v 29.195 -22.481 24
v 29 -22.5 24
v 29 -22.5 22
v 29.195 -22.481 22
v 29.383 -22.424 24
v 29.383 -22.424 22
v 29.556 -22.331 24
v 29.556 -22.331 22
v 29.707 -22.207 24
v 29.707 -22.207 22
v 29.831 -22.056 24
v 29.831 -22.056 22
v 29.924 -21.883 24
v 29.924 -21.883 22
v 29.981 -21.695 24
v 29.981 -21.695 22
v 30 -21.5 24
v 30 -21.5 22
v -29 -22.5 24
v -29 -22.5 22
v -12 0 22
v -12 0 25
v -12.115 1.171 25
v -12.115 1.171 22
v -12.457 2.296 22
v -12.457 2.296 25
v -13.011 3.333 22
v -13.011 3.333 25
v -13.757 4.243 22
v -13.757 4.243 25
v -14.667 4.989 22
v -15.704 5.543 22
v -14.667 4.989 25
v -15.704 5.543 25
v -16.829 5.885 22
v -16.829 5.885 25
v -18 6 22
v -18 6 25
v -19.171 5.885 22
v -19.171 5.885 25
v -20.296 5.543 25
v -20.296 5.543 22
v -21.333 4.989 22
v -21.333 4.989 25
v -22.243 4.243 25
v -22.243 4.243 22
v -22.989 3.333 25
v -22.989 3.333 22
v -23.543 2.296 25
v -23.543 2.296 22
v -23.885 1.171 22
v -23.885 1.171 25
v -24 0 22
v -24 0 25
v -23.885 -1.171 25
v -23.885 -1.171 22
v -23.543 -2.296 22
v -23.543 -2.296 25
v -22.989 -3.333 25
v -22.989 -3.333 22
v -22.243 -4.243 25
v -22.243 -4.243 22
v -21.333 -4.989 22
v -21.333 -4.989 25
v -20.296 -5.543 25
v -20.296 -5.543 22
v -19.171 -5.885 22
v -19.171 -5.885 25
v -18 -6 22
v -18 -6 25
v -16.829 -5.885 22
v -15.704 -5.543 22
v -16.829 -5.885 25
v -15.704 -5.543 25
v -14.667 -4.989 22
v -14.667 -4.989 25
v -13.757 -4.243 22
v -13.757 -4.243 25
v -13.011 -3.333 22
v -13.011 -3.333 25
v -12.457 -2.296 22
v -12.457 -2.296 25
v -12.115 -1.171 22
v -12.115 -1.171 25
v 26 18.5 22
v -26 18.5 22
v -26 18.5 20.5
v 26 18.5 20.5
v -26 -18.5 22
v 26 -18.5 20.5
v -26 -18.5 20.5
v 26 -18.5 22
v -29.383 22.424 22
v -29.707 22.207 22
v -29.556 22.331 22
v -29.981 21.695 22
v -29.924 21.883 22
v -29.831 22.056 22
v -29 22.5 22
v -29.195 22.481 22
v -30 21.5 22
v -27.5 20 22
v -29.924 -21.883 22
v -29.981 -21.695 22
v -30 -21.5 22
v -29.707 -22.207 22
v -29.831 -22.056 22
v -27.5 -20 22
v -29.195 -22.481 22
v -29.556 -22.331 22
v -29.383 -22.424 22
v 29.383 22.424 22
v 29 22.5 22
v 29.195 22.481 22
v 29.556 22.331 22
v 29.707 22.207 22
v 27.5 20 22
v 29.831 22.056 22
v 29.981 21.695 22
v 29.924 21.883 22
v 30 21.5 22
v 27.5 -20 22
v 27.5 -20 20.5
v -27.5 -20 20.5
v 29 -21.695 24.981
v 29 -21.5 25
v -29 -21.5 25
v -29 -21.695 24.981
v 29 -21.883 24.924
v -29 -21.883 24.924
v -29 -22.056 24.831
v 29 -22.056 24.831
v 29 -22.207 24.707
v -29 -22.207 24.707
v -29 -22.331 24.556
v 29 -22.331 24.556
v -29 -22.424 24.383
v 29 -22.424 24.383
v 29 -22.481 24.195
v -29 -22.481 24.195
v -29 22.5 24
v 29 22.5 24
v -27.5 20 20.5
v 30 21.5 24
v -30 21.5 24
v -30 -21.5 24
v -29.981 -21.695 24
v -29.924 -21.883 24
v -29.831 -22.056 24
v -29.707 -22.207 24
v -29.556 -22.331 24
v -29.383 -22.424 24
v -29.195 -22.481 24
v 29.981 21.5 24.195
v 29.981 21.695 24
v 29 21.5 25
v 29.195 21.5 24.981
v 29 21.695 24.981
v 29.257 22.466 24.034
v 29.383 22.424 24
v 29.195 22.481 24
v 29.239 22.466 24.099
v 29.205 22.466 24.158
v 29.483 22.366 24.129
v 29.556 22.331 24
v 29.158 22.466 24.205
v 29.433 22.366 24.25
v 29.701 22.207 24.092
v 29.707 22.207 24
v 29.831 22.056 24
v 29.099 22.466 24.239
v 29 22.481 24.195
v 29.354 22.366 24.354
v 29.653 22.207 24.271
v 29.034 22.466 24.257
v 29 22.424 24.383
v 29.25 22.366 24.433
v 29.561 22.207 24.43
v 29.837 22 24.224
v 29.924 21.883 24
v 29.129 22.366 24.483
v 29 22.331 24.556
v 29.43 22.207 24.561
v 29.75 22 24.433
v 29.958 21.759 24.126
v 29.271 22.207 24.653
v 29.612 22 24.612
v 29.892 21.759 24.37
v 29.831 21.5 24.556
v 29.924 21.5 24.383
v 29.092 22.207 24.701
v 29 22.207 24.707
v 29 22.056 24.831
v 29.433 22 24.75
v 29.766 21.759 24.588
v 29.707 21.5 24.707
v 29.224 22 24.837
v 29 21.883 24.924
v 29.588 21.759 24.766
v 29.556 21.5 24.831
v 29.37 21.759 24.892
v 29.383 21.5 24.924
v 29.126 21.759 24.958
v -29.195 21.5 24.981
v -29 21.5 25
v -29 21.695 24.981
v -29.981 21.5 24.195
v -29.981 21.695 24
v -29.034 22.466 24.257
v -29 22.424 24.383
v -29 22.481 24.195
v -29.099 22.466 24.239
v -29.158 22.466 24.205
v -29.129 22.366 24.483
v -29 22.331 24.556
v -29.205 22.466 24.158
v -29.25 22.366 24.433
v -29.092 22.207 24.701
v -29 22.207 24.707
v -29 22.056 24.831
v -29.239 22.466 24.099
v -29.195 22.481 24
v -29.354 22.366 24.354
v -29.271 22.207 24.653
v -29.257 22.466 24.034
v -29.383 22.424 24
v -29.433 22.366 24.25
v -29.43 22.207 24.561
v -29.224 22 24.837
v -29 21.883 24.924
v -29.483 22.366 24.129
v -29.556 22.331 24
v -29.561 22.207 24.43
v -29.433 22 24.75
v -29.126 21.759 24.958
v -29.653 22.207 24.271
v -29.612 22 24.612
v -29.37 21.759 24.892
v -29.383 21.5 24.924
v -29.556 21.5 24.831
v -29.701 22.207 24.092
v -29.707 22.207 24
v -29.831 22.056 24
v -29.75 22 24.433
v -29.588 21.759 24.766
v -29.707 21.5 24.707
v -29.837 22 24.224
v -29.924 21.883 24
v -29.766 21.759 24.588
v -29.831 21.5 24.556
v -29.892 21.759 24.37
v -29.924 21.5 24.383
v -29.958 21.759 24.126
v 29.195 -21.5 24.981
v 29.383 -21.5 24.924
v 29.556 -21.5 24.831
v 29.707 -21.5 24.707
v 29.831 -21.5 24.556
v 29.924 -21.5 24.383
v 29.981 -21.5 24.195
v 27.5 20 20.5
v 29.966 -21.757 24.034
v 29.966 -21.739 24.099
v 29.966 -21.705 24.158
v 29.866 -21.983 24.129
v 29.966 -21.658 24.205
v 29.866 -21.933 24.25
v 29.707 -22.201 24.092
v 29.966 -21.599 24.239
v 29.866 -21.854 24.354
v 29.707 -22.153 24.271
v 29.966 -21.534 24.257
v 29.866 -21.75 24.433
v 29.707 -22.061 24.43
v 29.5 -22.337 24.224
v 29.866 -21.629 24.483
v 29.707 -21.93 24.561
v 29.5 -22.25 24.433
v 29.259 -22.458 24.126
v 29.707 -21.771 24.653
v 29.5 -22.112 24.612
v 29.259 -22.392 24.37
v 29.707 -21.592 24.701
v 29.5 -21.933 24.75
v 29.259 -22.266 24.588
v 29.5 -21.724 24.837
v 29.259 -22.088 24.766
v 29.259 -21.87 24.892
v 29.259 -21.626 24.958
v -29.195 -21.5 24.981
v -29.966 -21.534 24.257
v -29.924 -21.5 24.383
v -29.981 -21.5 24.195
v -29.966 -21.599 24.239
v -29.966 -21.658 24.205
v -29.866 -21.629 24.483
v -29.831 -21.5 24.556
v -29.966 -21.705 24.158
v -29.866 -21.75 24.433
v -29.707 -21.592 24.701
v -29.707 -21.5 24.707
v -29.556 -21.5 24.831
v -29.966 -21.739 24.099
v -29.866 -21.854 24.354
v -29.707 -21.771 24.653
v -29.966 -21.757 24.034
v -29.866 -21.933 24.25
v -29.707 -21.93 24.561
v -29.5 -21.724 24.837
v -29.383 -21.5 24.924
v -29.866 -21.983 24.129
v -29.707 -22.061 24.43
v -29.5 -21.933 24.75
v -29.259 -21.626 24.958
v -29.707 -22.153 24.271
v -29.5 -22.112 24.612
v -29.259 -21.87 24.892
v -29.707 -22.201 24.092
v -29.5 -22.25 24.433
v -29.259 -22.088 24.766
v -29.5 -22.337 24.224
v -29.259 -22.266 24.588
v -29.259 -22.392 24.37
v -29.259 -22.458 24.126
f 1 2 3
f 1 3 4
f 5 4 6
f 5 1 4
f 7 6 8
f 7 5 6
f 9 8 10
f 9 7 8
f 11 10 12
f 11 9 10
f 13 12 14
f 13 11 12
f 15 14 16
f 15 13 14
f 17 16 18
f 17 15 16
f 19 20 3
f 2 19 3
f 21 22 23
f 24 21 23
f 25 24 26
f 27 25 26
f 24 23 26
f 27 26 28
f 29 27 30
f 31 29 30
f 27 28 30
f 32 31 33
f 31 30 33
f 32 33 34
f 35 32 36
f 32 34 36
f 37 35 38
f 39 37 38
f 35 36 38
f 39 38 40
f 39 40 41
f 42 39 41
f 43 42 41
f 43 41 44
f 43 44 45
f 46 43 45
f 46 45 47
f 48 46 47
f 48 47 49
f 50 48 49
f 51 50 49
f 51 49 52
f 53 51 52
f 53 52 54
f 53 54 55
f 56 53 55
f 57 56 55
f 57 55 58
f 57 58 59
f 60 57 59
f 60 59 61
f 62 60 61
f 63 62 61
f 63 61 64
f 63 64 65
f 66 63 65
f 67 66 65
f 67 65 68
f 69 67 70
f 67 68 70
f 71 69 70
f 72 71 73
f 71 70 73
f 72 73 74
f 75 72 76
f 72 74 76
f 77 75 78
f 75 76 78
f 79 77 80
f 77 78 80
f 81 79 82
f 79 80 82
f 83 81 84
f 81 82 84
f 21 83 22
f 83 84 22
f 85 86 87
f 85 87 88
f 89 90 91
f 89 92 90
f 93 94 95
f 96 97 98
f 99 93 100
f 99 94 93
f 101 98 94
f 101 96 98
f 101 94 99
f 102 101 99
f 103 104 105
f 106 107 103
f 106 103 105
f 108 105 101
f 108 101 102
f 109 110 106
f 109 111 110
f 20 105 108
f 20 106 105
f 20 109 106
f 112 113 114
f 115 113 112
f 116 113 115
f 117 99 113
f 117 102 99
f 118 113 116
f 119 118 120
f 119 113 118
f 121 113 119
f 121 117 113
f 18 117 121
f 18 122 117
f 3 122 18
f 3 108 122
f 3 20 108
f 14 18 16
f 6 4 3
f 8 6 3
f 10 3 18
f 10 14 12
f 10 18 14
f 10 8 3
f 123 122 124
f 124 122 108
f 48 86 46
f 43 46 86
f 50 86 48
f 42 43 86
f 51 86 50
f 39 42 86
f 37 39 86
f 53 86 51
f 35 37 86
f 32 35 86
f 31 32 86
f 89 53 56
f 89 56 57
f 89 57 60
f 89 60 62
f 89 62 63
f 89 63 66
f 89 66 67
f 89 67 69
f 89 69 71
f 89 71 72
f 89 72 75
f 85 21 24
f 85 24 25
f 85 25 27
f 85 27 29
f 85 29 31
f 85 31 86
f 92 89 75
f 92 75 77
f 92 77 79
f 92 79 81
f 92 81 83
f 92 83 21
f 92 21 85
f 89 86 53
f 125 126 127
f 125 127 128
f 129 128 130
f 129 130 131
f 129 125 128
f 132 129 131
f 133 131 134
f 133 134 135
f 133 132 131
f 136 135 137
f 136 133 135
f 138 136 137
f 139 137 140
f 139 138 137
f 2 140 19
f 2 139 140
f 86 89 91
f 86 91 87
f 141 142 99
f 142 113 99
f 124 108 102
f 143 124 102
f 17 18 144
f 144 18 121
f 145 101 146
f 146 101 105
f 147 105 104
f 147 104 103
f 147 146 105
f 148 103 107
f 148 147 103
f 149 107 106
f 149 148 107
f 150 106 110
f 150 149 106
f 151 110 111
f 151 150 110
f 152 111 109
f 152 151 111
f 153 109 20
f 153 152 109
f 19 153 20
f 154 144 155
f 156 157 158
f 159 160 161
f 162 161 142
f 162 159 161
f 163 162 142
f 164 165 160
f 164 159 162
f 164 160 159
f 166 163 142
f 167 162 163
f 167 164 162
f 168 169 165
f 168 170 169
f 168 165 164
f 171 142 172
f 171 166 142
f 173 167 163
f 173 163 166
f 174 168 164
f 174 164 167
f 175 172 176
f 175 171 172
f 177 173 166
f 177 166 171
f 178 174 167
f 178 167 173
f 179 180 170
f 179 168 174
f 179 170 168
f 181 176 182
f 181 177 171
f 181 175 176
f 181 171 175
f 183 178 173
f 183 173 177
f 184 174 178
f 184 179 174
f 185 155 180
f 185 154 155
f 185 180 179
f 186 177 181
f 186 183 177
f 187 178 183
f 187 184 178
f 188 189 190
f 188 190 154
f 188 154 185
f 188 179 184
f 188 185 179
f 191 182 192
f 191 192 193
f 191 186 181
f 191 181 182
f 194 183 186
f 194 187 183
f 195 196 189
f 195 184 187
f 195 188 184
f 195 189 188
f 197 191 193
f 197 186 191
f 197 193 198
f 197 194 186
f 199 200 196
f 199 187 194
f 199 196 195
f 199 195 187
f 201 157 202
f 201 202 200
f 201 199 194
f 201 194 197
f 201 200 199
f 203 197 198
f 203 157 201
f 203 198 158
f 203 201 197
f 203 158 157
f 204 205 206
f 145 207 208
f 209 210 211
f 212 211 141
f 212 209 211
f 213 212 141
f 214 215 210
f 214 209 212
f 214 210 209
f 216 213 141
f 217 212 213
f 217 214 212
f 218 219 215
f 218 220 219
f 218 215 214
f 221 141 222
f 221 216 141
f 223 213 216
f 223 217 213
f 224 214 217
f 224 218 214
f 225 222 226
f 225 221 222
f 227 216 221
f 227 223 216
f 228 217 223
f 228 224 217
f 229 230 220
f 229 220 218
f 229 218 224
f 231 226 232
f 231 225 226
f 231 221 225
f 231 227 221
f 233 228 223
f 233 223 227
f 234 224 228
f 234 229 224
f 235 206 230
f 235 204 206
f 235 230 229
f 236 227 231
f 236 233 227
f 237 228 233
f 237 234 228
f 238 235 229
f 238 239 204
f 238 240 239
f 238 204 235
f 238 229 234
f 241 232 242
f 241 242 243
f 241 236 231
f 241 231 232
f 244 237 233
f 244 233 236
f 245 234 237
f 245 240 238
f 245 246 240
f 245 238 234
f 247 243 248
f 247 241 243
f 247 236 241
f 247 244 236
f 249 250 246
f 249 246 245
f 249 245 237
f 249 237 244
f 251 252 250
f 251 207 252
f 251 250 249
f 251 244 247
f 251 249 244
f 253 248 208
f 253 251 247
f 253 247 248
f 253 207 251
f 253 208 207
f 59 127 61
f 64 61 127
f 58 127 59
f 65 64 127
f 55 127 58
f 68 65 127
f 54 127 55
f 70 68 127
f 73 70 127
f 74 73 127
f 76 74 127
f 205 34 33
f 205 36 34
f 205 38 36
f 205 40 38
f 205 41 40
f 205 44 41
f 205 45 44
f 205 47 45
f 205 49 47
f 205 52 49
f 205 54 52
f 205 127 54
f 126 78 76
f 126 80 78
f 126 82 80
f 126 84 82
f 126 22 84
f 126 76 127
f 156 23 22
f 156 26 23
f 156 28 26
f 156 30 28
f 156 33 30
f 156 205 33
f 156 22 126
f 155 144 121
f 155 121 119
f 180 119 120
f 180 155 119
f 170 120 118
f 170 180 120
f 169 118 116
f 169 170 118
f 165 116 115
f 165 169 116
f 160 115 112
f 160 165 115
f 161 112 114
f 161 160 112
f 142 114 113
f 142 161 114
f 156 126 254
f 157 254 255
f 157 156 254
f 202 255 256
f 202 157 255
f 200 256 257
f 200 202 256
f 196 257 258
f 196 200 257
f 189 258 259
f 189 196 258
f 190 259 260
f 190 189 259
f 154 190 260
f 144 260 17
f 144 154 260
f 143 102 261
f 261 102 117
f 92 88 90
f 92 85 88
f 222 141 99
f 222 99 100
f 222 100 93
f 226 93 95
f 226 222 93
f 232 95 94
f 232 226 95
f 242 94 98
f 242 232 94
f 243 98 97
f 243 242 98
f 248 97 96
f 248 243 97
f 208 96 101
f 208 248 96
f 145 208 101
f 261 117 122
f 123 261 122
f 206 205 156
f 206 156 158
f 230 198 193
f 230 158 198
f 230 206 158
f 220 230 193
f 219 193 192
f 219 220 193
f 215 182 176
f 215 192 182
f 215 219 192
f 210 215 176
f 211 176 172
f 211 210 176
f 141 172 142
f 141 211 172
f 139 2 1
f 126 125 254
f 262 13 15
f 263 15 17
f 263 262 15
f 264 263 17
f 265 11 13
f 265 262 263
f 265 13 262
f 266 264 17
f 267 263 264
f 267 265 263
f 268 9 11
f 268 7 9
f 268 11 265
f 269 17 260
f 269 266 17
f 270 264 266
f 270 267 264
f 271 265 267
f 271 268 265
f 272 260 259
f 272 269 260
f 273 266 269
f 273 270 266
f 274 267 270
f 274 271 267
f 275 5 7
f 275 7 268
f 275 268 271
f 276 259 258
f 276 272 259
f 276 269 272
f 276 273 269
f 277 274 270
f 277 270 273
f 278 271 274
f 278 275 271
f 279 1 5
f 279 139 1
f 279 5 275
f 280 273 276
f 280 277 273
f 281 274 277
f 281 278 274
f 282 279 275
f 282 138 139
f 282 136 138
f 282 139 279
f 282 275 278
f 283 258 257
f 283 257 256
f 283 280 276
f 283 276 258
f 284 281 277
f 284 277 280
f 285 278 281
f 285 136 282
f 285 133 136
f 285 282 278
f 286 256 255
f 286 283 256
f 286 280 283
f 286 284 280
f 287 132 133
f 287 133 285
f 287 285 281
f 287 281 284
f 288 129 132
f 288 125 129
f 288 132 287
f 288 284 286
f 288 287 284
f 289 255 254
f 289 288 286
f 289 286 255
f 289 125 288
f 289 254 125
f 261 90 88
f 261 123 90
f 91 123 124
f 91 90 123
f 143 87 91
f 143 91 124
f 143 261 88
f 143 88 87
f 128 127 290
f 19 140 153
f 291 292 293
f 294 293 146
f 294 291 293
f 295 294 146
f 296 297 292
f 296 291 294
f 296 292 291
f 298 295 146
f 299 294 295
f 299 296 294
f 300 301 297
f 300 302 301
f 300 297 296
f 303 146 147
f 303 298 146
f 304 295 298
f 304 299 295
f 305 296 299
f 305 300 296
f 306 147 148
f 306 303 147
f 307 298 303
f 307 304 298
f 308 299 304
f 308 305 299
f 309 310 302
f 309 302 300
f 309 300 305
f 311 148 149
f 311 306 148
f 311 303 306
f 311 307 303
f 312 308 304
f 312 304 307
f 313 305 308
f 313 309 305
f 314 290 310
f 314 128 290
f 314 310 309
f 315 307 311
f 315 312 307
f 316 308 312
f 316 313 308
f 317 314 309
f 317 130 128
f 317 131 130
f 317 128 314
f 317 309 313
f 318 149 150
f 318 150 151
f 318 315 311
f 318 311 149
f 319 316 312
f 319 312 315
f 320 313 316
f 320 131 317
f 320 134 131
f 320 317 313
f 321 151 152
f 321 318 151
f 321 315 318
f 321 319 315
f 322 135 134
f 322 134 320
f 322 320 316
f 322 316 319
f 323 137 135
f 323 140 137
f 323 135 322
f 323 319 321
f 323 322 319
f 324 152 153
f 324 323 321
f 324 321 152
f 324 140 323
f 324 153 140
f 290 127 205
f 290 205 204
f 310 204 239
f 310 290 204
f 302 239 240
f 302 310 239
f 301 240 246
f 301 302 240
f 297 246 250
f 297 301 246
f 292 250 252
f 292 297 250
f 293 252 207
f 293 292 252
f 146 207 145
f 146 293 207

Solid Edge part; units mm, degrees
sketch "Sketch1" plane through (0, 0, 0) normal (0, 0, 1) x (1, 0, 0)
  line L0 (30, 22.5) -> (-30, 22.5)
  line L1 (-30, 22.5) -> (-30, -22.5)
  line L2 (-30, -22.5) -> (30, -22.5)
  line L3 (30, -22.5) -> (30, 22.5)
extrude "Protrusion1" add sketch "Sketch1" along normal blind 25
sketch "Sketch2" plane through (0, -22.5, 12.5) normal (0, -1, 0) x (1, 0, 0)
  line L0 (7.5, -4.5) -> (-7.5, -4.5)
  line L1 (-7.5, -4.5) -> (-7.5, -9.5)
  line L2 (-7.5, -9.5) -> (7.5, -9.5)
  line L3 (7.5, -9.5) -> (7.5, -4.5)
  dimension "D1" = 3
  dimension "D2" = 5
  dimension "D3" = 15
extrude "ExtrudedCutout_1" cut sketch "Sketch2" against normal blind 70.2135
sketch "Sketch3" plane through (-30, 0, 12.5) normal (-1, 0, 0) x (0, -1, 0)
  line L0 (-5, -9.5) -> (5, -9.5)
  line L1 (5, -9.5) -> (5, -4.5)
  line L2 (5, -4.5) -> (-5, -4.5)
  line L3 (-5, -4.5) -> (-5, -9.5)
  dimension "D1" = 10
  dimension "D2" = 5
  dimension "D3" = 3
extrude "ExtrudedCutout_2" cut sketch "Sketch3" against normal blind 138.2134
fillet "Round_2" radius 2.5 16 edges at (-18.75, 5, 3) (-18.75, 5, 8) (-18.75, -5, 8) (-18.75, -5, 3) (18.75, 5, 3) (18.75, 5, 8) (18.75, -5, 8) (18.75, -5, 3) (7.5, -13.75, 8) (-7.5, -13.75, 8) (-7.5, -13.75, 3) (7.5, -13.75, 3) (7.5, 13.75, 3) (7.5, 13.75, 8) (-7.5, 13.75, 3) (-7.5, 13.75, 8)
sketch "Sketch4" plane through (0, 0, 25) normal (0, 0, 1) x (1, 0, 0)
  circle A0 centre (-18, 0) radius 6
  dimension "D1" = 12
extrude "ExtrudedCutout_3" cut sketch "Sketch4" against normal blind 20.7766
fillet "Round_3" radius 1 12 edges at (0, -22.5, 25) (-30, 0, 25) (-30, -22.5, 12.5) (30, -22.5, 12.5) (30, 0, 25) (0, 22.5, 25) (-30, 22.5, 12.5) (0, 22.5, 0) (-30, 0, 0) (0, -22.5, 0) (30, 0, 0) (30, 22.5, 12.5)
sketch "Sketch5" plane through (0, -22.5, 12.5) normal (0, -1, 0) x (1, 0, 0)
  line L0 (-30, 9.5) -> (31.8803, 9.5)
  line L1 (-30, 9.5) -> (-37.6022, -5.1016)
  line L2 (-37.6022, -5.1016) -> (-25.716, -26.0845)
  line L3 (-25.716, -26.0845) -> (61.3689, -24.1439)
  line L4 (61.3689, -24.1439) -> (49.3614, 9.5)
  line L5 (49.3614, 9.5) -> (31.8803, 9.5)
  dimension "D1" = 3
extrude "ExtrudedCutout_4" cut sketch "Sketch5" against normal blind 86.4781
sketch "Sketch6" plane through (0, 0, 22) normal (0, 0, -1) x (1, 0, 0)
  line L0 (-26, -18.5) -> (26, -18.5)
  line L1 (26, -18.5) -> (26, 18.5)
  line L2 (26, 18.5) -> (-26, 18.5)
  line L3 (-26, 18.5) -> (-26, -18.5)
  line L4 (-27.5, -20) -> (27.5, -20)
  line L5 (27.5, -20) -> (27.5, 20)
  line L6 (27.5, 20) -> (-27.5, 20)
  line L7 (-27.5, 20) -> (-27.5, -20)
  dimension "D1" = 37
  dimension "D2" = 52
  dimension "D3" = 55
  dimension "D4" = 40
extrude "ExtrudedProtrusion_2" add sketch "Sketch6" along normal blind 1.5
